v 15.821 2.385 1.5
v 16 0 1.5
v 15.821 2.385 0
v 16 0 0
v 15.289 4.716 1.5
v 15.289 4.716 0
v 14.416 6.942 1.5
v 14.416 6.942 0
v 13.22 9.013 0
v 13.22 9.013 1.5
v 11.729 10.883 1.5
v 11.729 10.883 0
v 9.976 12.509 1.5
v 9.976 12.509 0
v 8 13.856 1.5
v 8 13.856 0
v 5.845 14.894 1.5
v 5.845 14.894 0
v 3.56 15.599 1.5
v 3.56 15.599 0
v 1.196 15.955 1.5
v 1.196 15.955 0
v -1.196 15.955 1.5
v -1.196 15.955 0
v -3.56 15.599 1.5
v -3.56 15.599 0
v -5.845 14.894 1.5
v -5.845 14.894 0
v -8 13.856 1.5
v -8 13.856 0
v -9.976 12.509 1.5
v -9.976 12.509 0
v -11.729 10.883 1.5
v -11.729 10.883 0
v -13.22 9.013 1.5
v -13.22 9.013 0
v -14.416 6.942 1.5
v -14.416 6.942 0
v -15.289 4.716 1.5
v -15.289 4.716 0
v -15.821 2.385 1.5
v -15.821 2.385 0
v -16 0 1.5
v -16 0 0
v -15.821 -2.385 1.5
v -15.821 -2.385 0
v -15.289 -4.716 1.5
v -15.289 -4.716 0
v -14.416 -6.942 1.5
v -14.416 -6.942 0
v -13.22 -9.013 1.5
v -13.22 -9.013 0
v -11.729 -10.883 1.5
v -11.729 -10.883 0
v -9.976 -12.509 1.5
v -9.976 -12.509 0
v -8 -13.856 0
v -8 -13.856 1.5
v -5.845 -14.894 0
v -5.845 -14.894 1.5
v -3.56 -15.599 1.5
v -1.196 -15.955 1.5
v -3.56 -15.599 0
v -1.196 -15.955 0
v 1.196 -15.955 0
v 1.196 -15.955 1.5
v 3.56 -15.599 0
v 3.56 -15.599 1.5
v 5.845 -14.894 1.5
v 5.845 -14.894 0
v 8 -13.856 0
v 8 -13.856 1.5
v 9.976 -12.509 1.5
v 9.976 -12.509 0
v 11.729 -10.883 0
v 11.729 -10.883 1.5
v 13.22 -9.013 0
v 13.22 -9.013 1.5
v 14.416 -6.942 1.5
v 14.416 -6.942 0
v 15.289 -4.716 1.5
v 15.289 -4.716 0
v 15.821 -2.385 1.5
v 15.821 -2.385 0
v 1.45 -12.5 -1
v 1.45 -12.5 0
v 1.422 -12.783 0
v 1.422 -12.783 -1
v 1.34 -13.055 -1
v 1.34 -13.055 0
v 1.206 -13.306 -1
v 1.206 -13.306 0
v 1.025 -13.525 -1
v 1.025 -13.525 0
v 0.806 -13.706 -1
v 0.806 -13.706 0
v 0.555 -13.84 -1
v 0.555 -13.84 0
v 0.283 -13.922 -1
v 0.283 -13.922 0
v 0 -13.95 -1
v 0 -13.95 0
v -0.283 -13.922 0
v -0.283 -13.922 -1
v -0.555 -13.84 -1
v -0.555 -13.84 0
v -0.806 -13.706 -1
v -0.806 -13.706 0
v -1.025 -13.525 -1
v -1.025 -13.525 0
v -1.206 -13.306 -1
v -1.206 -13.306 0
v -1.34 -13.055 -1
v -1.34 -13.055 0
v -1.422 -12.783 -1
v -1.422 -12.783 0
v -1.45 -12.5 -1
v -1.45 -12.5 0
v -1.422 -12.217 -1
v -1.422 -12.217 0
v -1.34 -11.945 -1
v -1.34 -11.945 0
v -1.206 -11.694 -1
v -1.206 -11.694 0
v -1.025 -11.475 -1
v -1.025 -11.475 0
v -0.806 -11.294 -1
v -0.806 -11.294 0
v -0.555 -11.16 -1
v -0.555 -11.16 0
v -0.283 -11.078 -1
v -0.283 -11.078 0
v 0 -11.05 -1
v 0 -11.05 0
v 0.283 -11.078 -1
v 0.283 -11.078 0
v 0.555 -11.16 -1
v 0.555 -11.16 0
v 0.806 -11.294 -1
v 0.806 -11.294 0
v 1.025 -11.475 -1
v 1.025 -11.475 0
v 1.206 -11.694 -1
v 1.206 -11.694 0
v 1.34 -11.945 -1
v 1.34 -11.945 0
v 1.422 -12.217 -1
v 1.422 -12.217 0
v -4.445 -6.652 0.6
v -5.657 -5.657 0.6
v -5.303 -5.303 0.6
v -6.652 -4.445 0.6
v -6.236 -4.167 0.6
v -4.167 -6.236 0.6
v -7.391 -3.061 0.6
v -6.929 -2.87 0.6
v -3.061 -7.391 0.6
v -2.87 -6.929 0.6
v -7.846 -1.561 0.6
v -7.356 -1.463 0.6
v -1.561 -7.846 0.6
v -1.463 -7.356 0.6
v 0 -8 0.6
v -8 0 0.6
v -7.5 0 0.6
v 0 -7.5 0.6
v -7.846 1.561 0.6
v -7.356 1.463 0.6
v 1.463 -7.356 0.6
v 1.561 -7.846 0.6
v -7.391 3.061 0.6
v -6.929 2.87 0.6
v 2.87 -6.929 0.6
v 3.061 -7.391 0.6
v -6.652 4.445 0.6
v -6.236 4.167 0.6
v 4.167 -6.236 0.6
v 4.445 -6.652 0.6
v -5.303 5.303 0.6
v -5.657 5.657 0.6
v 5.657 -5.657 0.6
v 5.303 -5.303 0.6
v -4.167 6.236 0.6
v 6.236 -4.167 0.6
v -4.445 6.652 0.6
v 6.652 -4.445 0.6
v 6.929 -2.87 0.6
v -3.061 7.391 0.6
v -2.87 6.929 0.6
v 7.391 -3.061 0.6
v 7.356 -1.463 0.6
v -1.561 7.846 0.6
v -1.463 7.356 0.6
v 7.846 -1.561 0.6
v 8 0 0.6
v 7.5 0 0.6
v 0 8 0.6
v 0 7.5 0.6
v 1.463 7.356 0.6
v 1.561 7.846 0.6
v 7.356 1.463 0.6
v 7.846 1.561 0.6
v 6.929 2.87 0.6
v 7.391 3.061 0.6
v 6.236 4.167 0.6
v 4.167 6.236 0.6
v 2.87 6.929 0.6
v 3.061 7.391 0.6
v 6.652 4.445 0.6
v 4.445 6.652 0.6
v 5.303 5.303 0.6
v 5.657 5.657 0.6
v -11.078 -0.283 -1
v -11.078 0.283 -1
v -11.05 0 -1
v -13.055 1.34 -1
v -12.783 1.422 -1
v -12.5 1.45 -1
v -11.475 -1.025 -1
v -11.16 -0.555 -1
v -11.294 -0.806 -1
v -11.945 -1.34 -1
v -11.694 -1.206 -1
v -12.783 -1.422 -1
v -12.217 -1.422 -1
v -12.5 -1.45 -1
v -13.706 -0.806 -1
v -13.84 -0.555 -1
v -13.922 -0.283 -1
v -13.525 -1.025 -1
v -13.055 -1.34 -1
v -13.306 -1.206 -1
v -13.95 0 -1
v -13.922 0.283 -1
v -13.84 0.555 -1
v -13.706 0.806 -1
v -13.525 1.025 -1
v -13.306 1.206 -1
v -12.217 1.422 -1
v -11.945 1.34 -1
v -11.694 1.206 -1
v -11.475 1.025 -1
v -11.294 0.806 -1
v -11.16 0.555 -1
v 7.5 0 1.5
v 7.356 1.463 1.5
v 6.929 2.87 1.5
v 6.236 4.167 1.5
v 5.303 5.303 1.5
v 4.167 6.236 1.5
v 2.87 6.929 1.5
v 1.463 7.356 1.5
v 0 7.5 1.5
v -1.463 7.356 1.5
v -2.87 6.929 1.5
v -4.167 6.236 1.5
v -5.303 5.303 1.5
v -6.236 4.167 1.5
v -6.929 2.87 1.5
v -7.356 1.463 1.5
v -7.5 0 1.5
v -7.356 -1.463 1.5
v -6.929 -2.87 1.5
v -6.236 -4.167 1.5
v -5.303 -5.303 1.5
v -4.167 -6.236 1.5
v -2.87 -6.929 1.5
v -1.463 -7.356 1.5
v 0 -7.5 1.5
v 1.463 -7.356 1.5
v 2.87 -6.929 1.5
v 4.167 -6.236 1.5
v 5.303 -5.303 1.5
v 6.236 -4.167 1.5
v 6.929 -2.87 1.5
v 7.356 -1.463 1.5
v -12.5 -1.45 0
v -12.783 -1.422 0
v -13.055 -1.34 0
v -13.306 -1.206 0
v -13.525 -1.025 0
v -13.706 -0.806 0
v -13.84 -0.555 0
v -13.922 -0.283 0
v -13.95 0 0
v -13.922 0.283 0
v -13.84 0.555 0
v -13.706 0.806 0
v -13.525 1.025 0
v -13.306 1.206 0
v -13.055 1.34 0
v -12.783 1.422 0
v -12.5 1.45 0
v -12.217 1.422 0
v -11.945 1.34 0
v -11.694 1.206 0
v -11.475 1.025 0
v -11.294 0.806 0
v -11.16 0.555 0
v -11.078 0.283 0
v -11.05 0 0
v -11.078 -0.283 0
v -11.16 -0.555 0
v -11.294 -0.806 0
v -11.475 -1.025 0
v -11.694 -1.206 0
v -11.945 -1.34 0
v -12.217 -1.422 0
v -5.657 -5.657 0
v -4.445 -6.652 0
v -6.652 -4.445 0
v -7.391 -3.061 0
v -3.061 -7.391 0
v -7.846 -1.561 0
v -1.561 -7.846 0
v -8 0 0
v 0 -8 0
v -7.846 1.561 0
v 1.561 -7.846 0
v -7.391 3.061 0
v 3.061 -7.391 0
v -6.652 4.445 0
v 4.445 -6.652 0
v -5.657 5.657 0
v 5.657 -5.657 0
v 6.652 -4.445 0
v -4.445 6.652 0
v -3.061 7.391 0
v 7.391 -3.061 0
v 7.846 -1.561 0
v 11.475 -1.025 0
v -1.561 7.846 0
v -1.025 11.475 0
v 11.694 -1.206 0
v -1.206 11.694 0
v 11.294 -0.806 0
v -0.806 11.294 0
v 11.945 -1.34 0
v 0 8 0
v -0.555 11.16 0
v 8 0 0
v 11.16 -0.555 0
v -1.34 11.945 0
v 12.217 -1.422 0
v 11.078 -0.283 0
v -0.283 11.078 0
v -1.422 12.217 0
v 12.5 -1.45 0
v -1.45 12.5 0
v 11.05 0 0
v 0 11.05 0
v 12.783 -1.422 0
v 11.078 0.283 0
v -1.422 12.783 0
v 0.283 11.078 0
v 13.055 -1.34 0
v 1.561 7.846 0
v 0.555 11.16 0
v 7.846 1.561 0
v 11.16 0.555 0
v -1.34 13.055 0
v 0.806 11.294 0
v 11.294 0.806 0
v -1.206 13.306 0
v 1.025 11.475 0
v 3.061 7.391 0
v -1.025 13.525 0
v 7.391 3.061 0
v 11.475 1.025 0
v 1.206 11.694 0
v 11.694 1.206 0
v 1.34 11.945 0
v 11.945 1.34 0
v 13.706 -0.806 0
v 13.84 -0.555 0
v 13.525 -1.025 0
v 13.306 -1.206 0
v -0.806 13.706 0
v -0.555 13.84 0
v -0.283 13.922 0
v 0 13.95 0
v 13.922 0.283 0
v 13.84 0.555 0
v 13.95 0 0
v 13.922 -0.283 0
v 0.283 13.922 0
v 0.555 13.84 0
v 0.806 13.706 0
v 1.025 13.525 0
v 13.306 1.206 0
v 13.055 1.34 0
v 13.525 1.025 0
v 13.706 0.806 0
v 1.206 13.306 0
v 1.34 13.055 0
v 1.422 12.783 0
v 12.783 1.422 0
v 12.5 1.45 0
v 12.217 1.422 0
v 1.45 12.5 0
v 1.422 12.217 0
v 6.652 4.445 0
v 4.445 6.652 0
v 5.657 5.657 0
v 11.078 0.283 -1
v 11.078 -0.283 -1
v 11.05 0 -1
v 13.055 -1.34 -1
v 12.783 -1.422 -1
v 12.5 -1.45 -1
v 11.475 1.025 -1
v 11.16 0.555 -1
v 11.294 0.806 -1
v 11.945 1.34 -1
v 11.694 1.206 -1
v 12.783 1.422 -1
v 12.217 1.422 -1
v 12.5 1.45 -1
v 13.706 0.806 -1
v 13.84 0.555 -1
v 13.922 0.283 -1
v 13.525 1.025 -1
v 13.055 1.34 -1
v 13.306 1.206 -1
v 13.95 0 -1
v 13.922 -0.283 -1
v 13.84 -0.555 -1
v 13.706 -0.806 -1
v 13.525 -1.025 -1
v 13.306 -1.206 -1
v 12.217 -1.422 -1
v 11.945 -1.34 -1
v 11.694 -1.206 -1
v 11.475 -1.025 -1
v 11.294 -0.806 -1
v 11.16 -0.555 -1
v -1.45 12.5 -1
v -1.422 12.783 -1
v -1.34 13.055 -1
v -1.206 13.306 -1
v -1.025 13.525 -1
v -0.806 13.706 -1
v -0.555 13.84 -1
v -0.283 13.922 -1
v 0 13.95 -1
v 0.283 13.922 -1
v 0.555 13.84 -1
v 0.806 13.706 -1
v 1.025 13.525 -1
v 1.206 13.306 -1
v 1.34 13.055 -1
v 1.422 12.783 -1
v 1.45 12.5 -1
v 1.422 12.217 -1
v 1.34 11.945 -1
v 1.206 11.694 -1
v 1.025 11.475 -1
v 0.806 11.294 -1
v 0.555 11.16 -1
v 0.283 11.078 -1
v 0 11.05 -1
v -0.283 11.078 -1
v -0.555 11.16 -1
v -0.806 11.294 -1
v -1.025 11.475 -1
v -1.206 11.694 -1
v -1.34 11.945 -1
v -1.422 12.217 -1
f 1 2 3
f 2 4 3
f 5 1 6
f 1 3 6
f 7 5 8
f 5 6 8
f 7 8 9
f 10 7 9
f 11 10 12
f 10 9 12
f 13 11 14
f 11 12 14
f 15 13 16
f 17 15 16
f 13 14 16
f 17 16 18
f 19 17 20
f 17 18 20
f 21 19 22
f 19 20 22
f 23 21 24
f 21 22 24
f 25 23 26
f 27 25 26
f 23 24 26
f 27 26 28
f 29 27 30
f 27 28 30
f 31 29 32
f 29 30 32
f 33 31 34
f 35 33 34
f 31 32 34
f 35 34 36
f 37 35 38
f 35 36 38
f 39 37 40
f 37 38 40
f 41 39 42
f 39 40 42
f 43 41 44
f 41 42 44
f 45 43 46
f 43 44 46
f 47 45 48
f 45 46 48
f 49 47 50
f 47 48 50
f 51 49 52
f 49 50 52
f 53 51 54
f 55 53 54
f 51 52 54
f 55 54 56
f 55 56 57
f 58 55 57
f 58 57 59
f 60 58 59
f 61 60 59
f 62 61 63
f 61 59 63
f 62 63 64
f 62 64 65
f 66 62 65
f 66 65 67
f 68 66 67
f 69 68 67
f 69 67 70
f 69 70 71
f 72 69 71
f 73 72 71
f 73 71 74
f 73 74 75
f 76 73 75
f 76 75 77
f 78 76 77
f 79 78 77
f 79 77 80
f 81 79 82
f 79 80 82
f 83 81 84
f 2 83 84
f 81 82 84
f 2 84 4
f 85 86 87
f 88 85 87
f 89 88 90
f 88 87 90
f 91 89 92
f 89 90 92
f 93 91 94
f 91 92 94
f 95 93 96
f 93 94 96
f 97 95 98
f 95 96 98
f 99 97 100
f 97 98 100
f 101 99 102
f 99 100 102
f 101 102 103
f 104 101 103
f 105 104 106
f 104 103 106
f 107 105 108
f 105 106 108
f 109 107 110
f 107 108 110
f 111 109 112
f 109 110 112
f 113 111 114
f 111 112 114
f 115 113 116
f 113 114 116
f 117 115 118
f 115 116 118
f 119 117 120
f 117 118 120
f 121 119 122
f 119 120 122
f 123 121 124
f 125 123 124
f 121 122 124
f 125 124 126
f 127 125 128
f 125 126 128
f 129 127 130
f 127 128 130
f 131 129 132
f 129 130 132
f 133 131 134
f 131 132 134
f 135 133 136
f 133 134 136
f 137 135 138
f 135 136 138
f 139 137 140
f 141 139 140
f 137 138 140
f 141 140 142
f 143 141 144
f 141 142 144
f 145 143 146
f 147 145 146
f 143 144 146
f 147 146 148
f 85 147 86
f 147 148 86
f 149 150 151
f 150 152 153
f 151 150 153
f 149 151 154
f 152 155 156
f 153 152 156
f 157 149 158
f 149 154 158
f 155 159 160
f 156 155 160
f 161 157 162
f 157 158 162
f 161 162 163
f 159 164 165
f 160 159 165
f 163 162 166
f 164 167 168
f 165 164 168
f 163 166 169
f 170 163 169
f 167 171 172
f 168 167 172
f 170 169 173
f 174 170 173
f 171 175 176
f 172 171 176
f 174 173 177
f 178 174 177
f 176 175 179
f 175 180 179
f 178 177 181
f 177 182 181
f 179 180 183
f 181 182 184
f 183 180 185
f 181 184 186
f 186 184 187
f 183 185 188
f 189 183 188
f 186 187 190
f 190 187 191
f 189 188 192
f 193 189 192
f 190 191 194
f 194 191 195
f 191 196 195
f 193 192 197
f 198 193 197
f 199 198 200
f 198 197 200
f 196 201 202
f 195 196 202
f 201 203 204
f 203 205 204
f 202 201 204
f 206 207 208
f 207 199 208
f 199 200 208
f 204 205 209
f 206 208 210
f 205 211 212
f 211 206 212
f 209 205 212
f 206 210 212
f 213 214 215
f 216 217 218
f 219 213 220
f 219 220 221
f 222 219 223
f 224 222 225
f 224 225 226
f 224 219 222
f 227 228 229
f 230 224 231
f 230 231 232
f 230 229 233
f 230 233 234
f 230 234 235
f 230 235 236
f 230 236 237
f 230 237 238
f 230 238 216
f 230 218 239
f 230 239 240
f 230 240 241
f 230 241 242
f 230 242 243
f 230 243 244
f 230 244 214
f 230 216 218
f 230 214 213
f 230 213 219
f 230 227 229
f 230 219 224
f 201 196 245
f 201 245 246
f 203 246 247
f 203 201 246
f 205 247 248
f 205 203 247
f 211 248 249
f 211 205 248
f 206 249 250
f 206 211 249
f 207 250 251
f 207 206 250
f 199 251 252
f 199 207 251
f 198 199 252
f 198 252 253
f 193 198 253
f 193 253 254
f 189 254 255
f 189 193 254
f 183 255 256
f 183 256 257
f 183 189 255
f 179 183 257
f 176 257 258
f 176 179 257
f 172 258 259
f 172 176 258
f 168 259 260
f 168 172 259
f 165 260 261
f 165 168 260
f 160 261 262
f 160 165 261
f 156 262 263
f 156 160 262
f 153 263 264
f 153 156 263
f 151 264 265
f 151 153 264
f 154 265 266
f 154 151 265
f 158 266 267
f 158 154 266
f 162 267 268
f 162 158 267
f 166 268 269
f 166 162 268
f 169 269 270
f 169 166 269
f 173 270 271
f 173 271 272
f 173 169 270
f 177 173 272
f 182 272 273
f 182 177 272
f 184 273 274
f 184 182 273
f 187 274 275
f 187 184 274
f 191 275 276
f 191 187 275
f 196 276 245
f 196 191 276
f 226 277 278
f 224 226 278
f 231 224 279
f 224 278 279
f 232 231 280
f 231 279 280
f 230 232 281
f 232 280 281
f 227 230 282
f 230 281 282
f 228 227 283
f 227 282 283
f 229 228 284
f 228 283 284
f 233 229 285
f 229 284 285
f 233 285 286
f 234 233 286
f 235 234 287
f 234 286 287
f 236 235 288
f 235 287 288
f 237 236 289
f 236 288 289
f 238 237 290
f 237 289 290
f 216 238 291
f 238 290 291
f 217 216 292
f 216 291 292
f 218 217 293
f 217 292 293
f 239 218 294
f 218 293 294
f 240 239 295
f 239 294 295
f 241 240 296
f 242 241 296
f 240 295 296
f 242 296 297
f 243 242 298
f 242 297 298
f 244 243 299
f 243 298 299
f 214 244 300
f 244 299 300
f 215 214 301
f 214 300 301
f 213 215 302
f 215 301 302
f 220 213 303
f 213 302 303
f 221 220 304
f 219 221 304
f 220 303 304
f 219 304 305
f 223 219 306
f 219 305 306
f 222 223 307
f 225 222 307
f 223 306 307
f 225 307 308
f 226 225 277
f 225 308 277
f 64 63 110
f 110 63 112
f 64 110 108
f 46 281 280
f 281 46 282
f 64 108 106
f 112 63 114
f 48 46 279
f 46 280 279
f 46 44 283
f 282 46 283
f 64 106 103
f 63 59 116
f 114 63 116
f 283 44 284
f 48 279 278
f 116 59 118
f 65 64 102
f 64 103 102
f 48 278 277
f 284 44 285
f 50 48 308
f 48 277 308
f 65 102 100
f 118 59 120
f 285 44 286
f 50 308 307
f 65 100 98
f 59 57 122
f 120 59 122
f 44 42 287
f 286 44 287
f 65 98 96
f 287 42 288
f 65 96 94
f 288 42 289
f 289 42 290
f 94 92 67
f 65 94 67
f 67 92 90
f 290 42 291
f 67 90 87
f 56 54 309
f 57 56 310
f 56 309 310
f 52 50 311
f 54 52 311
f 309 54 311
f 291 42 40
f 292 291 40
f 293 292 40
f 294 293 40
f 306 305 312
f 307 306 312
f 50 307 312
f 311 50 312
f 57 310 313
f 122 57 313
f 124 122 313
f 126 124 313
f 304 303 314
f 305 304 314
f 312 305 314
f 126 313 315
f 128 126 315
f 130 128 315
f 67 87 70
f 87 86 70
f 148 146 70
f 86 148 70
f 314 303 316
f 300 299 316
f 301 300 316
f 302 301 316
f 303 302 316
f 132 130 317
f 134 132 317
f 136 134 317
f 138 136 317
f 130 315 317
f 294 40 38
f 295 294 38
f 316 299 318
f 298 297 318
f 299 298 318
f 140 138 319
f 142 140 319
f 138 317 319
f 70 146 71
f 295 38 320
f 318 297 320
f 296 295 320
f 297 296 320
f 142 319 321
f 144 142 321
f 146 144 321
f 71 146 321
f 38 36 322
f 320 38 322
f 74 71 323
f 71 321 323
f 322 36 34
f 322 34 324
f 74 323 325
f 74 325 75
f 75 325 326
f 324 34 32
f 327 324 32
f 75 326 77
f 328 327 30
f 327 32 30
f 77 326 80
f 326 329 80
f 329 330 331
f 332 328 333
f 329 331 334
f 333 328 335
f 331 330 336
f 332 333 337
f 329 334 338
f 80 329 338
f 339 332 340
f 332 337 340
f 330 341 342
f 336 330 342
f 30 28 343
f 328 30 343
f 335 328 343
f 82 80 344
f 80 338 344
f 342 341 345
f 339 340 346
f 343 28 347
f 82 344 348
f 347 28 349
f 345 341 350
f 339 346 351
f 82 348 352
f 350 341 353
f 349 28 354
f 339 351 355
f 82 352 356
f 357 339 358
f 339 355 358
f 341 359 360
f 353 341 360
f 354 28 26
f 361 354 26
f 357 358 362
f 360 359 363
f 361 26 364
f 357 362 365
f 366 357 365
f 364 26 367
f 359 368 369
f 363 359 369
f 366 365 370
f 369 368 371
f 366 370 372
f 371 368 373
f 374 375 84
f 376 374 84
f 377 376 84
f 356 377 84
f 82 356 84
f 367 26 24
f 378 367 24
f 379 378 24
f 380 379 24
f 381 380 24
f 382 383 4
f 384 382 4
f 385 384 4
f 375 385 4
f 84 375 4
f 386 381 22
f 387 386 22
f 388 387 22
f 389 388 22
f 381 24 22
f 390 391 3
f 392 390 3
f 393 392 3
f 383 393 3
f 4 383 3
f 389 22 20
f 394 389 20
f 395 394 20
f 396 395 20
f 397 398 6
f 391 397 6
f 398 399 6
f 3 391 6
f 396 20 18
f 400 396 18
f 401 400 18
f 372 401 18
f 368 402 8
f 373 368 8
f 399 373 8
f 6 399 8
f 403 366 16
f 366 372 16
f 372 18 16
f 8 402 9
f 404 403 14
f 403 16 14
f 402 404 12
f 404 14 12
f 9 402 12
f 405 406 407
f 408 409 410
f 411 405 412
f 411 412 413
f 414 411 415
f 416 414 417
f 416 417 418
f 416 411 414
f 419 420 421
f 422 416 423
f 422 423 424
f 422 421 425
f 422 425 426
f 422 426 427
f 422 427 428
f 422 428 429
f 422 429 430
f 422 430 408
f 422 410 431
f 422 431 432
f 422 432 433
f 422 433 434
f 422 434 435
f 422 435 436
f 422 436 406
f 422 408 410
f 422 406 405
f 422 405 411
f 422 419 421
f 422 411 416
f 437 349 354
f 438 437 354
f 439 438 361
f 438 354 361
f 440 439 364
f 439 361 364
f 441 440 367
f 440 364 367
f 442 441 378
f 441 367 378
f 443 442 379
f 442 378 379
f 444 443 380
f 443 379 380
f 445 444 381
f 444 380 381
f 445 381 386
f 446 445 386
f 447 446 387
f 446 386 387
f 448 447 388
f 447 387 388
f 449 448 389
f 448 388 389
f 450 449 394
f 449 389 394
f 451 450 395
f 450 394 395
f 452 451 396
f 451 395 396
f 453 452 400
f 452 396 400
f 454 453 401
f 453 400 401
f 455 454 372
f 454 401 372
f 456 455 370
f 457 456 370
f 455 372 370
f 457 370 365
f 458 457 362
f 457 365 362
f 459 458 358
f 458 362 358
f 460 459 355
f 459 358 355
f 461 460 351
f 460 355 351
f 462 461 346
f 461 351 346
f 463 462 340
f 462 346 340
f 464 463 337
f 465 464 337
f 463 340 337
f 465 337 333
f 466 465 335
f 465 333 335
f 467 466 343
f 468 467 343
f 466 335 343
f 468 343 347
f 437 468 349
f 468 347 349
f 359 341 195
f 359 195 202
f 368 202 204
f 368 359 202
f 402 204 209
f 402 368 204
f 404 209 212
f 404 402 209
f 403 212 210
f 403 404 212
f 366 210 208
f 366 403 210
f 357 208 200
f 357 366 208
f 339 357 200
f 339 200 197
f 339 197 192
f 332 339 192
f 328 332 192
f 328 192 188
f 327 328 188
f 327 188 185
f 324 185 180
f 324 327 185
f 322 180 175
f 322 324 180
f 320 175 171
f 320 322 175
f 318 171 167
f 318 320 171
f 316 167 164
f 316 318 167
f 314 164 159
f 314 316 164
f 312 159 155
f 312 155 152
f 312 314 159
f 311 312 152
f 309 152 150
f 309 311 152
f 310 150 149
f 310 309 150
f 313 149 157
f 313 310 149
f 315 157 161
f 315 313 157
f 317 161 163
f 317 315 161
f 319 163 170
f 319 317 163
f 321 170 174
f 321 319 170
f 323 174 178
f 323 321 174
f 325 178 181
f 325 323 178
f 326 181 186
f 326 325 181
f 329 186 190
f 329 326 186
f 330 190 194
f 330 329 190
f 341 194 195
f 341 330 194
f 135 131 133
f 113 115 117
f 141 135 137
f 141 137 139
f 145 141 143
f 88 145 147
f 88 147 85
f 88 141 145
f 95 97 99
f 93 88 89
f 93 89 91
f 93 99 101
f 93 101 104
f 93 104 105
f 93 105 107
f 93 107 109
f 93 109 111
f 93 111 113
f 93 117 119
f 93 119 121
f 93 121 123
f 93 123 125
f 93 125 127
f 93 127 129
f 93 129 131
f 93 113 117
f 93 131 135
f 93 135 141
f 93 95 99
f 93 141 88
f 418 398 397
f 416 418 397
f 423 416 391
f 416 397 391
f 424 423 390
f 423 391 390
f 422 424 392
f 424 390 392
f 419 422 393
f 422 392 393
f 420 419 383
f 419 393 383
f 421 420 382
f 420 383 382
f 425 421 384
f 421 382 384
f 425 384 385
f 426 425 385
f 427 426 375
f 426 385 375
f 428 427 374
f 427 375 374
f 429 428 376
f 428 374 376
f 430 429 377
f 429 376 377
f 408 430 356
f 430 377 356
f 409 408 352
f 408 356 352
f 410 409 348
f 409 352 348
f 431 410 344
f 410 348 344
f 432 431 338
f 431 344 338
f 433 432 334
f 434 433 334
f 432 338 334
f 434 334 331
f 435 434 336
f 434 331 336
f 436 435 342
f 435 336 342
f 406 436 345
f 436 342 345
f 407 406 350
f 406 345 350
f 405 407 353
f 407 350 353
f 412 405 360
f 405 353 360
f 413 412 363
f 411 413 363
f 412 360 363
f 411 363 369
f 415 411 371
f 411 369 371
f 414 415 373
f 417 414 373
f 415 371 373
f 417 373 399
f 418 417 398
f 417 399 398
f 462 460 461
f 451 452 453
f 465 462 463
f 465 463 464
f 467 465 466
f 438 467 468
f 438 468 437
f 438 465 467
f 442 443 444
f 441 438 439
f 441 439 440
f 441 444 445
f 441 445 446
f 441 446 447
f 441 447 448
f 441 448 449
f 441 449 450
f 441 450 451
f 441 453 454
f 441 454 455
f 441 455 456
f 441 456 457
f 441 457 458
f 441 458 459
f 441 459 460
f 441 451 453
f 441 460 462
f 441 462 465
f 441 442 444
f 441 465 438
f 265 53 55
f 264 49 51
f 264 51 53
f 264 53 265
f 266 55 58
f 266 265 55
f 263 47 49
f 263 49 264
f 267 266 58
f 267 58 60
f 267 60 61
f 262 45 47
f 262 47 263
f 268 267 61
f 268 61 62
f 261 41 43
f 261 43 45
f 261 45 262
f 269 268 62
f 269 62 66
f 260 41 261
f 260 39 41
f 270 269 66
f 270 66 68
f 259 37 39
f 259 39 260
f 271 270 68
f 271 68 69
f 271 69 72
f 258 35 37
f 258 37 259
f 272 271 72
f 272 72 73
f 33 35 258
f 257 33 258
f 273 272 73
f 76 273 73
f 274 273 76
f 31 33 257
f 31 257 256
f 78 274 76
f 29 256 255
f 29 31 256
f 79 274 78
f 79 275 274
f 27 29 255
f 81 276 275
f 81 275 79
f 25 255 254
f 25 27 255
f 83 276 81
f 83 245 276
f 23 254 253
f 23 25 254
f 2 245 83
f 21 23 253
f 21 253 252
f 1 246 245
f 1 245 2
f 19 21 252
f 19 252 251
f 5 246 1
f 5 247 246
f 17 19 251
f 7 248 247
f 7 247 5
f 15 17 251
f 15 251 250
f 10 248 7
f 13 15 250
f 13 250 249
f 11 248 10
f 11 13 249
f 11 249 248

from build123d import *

# Parameters (mm, degrees)
SCHIZZO1_R                   = 16
SCHIZZO1_R_2                 = 8
ESTRUSIONE_ESTRUSIONE1_DEPTH = 0.6
SCHIZZO3_R                   = 16
SCHIZZO3_R_2                 = 7.5
ESTRUSIONE_ESTRUSIONE2_DEPTH = 0.9
SCHIZZO5_R                   = 1.45
ESTRUSIONE_ESTRUSIONE3_DEPTH = 1
RIPETIZIONECIRCOLARE1_COUNT  = 4


with BuildPart() as part:
    # Schizzo1 → Estrusione-Estrusione1 (new body)
    with BuildSketch(Plane.XY):
        Circle(SCHIZZO1_R)
        Circle(SCHIZZO1_R_2, mode=Mode.SUBTRACT)
    extrude(amount=ESTRUSIONE_ESTRUSIONE1_DEPTH)

    # Schizzo3 → Estrusione-Estrusione2 (add)
    with BuildSketch(Plane.XY.offset(0.6)):
        Circle(SCHIZZO3_R)
        Circle(SCHIZZO3_R_2, mode=Mode.SUBTRACT)
    extrude(amount=ESTRUSIONE_ESTRUSIONE2_DEPTH)

    # Schizzo5 → Estrusione-Estrusione3 (add)
    with BuildSketch(Plane(origin=(0, 0, 0), x_dir=(-1, 0, 0), z_dir=(0, 0, -1))):
        with Locations((0, 12.5)):
            Circle(SCHIZZO5_R)
    estrusione_estrusione3 = extrude(amount=ESTRUSIONE_ESTRUSIONE3_DEPTH)

    # RipetizioneCircolare1: Estrusione-Estrusione3 ×4 about axis
    ripetizionecircolare1_axis = Axis((0, 0, 0), (0, 0, 1))
    for i in range(1, RIPETIZIONECIRCOLARE1_COUNT):
        add(estrusione_estrusione3.rotate(ripetizionecircolare1_axis, i * 360 / RIPETIZIONECIRCOLARE1_COUNT))


solid = part.part
